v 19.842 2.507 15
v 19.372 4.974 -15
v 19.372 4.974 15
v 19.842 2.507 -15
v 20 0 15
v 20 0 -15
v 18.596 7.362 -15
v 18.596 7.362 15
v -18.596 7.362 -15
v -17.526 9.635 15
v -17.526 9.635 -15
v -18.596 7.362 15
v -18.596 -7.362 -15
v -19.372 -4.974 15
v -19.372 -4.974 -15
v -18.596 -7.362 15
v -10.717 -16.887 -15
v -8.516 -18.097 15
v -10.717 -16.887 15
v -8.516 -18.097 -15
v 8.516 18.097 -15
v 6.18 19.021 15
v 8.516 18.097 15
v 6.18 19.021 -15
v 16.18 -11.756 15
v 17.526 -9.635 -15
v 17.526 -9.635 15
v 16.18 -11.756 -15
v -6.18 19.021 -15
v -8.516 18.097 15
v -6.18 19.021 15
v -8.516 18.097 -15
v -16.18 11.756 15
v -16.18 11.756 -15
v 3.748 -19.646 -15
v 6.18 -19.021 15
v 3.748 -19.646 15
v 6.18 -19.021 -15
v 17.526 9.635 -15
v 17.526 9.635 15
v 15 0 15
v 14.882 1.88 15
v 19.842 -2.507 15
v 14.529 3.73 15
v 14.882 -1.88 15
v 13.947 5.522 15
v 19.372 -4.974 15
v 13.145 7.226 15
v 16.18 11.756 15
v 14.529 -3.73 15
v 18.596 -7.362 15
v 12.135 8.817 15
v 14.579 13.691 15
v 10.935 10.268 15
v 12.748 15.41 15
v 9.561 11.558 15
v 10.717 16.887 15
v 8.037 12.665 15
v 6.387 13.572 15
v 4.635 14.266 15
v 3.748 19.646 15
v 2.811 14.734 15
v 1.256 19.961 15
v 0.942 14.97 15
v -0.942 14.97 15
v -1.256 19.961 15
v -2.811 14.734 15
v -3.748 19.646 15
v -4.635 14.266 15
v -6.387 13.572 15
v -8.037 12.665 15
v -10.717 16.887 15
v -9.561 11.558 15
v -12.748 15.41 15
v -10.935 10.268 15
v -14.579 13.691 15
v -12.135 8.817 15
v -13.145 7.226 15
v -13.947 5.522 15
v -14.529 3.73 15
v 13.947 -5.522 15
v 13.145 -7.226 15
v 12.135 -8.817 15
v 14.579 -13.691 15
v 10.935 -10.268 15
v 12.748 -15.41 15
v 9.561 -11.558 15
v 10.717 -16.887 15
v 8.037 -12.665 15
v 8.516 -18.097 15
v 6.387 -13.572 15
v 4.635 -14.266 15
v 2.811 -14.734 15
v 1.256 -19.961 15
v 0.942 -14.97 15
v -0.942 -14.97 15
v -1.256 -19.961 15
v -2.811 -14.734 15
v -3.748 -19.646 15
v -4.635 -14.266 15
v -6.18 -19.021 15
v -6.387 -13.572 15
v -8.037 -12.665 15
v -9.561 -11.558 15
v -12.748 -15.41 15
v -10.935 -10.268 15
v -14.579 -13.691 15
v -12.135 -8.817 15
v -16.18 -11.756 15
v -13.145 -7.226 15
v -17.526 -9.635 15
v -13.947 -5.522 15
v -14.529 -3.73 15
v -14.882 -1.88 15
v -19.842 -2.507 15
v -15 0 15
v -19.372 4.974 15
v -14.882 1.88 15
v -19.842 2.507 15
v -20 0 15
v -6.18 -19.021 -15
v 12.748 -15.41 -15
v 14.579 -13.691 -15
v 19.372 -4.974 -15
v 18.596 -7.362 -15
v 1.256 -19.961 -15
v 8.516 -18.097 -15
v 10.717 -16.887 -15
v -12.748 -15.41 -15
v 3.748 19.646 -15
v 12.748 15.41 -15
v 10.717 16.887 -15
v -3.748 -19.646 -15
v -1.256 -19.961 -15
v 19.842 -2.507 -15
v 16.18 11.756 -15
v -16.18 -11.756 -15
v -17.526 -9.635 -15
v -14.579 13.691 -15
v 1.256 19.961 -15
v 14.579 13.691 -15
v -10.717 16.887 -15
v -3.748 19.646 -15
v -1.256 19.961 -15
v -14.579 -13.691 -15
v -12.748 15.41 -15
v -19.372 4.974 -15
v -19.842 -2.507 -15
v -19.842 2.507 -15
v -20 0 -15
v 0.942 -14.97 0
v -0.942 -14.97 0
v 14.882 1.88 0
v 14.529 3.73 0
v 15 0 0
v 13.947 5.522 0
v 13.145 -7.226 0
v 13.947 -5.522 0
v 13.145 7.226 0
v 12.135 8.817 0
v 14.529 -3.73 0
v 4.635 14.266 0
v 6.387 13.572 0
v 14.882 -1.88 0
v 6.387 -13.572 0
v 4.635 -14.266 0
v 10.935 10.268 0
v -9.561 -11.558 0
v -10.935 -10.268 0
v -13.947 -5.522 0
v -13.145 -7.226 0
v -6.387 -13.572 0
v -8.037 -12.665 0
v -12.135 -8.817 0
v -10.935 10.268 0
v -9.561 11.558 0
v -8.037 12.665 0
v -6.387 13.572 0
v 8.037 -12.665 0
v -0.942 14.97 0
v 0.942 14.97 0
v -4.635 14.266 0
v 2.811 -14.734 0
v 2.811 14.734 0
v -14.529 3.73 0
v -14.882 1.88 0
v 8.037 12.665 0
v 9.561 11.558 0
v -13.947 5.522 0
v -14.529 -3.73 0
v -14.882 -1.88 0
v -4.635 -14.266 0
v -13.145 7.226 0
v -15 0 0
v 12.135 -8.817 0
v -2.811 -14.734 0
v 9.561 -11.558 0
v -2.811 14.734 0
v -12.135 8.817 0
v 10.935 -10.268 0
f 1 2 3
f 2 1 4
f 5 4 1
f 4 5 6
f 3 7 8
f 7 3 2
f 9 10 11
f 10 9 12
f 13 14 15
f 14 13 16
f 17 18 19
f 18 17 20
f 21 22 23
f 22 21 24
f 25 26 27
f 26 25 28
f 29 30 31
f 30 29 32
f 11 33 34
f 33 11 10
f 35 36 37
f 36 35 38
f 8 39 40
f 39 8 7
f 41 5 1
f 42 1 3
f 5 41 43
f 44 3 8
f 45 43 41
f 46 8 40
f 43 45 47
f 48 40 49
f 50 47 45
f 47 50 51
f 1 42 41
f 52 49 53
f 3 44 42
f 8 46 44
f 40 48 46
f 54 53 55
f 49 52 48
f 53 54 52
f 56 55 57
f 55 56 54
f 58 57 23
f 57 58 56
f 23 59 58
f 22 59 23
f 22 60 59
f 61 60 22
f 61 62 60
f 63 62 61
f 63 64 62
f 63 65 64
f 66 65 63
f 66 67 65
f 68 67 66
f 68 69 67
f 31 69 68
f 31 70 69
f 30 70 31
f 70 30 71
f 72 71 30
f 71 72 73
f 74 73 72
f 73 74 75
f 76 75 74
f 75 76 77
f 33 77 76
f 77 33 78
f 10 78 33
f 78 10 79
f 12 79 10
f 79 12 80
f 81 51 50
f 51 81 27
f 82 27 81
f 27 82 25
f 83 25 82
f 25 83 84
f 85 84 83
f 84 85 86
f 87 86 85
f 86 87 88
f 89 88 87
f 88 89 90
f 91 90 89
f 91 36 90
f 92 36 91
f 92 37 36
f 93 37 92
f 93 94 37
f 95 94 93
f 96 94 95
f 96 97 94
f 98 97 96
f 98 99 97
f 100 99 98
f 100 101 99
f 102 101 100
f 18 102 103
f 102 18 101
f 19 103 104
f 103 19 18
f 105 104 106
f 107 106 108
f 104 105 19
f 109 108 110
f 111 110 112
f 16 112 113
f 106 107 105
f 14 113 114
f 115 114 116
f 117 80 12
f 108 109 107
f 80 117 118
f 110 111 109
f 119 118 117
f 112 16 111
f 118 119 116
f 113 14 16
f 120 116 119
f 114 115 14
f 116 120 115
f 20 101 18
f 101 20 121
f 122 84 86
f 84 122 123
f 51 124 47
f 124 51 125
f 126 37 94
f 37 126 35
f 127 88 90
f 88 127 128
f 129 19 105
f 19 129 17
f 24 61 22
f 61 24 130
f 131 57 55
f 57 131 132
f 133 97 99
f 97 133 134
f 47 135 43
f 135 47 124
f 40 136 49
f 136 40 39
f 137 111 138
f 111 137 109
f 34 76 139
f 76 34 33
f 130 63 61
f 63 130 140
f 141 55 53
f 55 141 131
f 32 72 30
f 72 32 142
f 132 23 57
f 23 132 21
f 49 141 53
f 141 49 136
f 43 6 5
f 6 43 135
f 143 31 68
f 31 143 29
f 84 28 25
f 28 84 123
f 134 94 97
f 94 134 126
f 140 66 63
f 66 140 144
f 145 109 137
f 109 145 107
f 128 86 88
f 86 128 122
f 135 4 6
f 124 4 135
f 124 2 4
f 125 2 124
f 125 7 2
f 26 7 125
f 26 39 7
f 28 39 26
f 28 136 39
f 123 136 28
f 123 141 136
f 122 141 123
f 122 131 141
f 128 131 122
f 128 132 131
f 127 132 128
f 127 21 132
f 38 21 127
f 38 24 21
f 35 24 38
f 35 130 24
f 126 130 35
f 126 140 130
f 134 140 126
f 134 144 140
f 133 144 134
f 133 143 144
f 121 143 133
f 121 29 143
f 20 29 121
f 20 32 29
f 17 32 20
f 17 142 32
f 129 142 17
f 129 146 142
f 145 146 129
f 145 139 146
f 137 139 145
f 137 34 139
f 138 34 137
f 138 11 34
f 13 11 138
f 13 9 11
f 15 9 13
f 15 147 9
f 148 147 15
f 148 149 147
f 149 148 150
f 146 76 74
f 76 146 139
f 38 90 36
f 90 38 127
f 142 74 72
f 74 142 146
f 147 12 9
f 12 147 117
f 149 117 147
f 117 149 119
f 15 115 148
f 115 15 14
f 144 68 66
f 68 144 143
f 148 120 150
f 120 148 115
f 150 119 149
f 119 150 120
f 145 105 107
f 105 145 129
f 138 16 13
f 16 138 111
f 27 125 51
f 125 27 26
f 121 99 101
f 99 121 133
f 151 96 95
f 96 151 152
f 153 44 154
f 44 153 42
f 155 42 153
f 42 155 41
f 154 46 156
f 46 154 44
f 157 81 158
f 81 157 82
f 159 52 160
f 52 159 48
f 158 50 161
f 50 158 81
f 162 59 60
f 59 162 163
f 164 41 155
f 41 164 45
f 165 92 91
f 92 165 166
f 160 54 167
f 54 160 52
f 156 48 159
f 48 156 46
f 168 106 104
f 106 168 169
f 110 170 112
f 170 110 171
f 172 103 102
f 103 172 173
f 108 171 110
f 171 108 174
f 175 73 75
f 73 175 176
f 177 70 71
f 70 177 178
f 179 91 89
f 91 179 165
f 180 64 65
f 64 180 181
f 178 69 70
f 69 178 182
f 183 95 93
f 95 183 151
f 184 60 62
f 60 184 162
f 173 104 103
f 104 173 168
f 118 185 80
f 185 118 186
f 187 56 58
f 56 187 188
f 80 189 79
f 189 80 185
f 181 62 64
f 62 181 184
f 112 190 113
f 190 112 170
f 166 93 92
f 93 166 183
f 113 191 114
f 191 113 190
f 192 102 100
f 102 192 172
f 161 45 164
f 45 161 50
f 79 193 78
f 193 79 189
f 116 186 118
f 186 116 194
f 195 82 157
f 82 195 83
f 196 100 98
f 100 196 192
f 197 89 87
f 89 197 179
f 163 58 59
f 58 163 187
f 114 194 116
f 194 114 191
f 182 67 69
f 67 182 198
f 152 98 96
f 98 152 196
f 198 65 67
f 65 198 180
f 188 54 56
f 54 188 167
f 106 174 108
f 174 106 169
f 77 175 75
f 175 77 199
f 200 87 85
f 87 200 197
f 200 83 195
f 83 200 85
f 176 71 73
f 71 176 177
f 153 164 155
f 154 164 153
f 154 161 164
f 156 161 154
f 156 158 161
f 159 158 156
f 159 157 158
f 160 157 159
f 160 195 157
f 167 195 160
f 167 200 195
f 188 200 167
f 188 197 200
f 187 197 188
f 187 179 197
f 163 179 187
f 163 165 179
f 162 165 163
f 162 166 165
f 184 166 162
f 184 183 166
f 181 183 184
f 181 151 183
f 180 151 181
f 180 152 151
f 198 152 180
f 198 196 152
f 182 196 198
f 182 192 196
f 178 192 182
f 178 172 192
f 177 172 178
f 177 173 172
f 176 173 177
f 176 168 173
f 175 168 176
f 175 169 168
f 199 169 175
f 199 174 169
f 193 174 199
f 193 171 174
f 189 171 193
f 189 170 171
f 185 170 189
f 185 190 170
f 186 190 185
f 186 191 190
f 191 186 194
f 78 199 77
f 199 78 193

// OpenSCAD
//increases resolution
$fn = 50;

//sphere(50);
//cube(50);
//cube([160, 50, 50]);
//cube ([20,10,10]);
//cylinder(20, 10, 0);

//translate([0,10,0]) cylinder(20,10,0);

/*translate([0,10,0]) {
	cylinder(10,10,0);
	cube([2,2,40], center = true);
}

scale([2,2,1.5]){
	 sphere(10);
}*/

/*hull() {
	cylinder(11,4.5,4.5);
	translate([0,10,0]) cylinder(17,4.5,4.5);
}*/
	
difference(){
	cylinder(30,20,20, center=true);
	translate([0,0,0]) cylinder(35,15,15);
	//translate([0,0,10]) cube([100,100,5]);
	//translate([0,0,-10]) cube([100,100,5]);
	//translate([0,0,0]) cube([100,100,5]);
	//translate([0,0,-15]) cube([100,100,5]);
	
	
}

/*intersection(){
	cylinder(18,4,4, center=true);
	rotate([90,0,0]) cylinder(18,2,2, center=true);
 cylinder(20,2,2, center=true);
}*/

/*difference(){
	union(){
	cylinder(20,5,5, center=true);
	translate([0,0,-10]) sphere(10);
}
	cylinder(22,2,2);
}*/
